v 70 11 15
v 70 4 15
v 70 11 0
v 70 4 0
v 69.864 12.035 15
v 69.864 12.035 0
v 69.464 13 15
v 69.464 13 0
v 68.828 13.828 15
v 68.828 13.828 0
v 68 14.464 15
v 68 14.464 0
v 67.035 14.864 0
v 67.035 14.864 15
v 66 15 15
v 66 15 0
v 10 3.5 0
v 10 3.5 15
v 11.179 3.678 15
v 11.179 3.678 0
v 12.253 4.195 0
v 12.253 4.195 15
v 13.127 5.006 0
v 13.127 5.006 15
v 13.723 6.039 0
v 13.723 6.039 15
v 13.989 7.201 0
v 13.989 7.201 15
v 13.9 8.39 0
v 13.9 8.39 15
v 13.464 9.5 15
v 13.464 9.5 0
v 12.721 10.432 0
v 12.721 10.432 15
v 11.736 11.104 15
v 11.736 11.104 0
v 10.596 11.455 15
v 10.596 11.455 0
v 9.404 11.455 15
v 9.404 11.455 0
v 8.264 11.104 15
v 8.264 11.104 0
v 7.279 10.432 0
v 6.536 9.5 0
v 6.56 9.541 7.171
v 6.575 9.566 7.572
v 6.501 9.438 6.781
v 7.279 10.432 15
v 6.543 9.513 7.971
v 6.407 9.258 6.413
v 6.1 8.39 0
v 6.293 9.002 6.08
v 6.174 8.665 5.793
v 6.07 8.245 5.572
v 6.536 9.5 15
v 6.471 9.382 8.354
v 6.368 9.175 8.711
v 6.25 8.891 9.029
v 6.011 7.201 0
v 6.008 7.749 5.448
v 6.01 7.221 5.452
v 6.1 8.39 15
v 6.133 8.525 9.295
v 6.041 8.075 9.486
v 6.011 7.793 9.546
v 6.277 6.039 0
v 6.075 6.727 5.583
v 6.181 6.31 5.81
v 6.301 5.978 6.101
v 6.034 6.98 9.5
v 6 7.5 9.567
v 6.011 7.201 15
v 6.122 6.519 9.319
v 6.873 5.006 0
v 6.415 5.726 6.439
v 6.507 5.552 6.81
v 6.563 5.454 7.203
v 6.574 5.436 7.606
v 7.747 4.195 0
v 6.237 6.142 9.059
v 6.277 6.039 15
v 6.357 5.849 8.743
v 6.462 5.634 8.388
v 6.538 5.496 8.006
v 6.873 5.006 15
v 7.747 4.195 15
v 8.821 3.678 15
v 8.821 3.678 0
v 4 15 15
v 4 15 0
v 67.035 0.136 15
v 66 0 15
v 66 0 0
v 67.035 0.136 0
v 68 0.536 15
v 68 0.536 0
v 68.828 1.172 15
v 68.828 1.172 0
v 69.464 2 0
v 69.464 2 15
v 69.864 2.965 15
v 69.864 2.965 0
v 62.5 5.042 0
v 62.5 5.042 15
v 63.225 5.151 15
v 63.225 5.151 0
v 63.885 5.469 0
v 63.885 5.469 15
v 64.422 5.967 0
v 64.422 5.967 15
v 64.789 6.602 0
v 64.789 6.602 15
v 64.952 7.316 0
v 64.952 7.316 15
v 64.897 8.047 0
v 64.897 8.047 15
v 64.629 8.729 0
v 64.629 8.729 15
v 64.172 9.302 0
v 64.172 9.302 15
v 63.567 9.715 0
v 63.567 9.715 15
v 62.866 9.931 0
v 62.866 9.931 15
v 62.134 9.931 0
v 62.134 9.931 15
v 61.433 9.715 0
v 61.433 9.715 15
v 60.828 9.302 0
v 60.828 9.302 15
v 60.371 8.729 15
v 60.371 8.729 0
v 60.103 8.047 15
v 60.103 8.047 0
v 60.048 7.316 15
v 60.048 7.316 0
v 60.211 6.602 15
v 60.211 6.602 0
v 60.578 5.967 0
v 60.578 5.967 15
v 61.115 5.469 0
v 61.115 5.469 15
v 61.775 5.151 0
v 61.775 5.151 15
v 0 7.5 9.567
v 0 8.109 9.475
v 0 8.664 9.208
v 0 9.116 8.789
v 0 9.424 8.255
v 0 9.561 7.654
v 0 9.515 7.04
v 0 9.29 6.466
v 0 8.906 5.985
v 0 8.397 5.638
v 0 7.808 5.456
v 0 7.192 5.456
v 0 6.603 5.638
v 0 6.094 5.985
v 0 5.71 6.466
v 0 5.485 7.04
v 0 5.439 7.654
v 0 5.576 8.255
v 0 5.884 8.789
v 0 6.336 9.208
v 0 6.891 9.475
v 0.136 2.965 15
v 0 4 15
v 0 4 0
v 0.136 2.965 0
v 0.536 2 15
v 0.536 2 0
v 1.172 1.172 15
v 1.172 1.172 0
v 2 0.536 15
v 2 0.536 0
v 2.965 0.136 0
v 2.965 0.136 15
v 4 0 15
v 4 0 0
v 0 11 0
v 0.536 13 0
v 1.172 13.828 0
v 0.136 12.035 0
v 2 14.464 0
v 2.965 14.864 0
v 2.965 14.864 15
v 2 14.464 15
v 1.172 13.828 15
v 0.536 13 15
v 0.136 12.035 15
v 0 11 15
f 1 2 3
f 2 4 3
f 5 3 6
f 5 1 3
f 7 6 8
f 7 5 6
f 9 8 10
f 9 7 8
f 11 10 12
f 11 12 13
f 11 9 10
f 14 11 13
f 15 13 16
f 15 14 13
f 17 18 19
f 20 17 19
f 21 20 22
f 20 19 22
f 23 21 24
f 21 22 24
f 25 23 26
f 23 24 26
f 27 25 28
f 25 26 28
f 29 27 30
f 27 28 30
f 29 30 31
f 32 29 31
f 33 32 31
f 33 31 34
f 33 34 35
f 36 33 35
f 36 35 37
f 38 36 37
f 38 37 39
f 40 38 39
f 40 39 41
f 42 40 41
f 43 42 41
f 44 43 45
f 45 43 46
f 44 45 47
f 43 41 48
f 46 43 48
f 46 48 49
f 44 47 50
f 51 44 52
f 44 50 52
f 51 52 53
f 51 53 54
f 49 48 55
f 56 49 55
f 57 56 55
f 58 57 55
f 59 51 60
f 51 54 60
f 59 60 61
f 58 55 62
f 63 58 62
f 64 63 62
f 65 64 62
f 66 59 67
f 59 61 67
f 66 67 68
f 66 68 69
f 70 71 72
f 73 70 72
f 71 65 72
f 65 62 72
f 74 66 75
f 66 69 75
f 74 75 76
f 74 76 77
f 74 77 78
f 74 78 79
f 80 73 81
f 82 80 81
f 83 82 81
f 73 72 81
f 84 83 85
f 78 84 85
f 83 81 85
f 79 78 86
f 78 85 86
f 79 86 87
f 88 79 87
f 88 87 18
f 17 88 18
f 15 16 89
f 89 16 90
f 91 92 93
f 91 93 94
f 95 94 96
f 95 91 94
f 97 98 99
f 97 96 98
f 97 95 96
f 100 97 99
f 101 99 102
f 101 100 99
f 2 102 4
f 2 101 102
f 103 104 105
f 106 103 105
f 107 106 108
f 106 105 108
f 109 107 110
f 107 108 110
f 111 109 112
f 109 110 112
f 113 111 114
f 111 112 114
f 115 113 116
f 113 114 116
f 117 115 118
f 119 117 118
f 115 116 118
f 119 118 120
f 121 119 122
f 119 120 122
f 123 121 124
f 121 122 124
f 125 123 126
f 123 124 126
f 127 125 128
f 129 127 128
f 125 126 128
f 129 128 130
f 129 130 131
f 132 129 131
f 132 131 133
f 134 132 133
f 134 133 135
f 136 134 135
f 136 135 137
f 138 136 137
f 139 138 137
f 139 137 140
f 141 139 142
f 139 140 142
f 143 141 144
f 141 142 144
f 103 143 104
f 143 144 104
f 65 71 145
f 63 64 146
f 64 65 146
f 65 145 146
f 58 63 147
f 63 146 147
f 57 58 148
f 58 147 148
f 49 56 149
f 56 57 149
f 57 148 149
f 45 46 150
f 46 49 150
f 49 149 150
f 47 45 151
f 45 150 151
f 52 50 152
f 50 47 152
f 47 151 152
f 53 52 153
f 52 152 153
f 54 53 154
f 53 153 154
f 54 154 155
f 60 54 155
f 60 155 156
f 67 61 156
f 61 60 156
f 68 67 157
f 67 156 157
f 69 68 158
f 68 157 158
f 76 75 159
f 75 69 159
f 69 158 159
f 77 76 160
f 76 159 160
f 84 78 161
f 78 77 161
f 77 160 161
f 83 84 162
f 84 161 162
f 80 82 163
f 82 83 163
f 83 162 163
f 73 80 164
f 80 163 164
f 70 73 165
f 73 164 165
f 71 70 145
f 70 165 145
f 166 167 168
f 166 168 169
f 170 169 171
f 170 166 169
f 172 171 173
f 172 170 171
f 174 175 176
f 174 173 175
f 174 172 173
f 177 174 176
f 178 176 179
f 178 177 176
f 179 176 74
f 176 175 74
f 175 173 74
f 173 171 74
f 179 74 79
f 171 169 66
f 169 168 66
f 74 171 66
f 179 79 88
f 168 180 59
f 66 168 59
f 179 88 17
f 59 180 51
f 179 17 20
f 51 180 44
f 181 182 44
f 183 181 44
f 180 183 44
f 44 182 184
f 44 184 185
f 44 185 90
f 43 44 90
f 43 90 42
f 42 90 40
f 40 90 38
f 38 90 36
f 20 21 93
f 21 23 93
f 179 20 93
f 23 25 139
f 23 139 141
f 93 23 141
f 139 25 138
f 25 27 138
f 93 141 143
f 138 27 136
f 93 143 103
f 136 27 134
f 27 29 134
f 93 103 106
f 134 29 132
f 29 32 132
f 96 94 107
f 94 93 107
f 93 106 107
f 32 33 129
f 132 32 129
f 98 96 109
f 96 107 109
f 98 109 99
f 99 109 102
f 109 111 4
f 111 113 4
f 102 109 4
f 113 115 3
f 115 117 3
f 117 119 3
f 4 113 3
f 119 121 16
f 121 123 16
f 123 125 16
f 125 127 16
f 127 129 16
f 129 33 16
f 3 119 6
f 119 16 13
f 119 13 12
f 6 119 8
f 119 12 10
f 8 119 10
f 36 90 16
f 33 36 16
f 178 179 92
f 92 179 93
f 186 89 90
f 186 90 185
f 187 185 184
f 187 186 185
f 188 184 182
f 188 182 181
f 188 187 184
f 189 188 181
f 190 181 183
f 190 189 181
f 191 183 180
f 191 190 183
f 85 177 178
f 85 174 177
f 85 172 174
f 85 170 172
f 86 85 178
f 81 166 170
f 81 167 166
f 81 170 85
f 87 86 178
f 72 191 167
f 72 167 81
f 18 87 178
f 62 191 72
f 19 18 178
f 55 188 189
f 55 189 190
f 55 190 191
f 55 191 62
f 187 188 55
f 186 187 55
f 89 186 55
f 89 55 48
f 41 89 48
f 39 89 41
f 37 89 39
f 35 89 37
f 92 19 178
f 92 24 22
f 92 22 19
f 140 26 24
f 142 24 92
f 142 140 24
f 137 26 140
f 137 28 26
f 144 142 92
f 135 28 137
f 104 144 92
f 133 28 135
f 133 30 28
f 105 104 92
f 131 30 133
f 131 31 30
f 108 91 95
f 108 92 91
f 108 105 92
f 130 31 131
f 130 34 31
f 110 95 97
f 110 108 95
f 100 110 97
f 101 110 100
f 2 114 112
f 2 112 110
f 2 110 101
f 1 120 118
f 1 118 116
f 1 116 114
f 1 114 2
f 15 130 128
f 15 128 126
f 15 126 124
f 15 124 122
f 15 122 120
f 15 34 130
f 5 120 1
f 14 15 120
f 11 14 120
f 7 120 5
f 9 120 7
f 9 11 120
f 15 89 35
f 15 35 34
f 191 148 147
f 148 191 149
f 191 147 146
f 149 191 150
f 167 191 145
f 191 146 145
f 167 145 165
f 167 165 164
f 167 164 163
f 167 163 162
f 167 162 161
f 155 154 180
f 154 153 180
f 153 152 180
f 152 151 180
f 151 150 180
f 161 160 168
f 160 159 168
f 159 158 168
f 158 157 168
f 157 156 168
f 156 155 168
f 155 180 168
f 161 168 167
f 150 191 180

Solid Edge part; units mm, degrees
sketch "Sketch1" plane through (0, 0, 0) normal (0, 0, 1) x (1, 0, 0)
  line L0 (70, 0) -> (70, 15)
  line L1 (70, 15) -> (0, 15)
  line L2 (0, 15) -> (0, 0)
  line L3 (0, 0) -> (70, 0)
extrude "Protrusion1" add sketch "Sketch1" along normal blind 15
hole "Bohrung_1" at (10, 7.5, 15) direction (0, 0, -1) diameter 8 end through all
hole "Bohrung_2" at (62.5, 7.5, 15) direction (0, 0, -1) diameter 4.917 end through all
hole "Bohrung_3" at (0, 7.5, 7.5) direction (1, 0, 0) diameter 4.134 end up to next
fillet "Verrundung_1" radius 4 4 edges at (70, 15, 7.5) (70, 0, 7.5) (0, 15, 7.5) (0, 0, 7.5)
